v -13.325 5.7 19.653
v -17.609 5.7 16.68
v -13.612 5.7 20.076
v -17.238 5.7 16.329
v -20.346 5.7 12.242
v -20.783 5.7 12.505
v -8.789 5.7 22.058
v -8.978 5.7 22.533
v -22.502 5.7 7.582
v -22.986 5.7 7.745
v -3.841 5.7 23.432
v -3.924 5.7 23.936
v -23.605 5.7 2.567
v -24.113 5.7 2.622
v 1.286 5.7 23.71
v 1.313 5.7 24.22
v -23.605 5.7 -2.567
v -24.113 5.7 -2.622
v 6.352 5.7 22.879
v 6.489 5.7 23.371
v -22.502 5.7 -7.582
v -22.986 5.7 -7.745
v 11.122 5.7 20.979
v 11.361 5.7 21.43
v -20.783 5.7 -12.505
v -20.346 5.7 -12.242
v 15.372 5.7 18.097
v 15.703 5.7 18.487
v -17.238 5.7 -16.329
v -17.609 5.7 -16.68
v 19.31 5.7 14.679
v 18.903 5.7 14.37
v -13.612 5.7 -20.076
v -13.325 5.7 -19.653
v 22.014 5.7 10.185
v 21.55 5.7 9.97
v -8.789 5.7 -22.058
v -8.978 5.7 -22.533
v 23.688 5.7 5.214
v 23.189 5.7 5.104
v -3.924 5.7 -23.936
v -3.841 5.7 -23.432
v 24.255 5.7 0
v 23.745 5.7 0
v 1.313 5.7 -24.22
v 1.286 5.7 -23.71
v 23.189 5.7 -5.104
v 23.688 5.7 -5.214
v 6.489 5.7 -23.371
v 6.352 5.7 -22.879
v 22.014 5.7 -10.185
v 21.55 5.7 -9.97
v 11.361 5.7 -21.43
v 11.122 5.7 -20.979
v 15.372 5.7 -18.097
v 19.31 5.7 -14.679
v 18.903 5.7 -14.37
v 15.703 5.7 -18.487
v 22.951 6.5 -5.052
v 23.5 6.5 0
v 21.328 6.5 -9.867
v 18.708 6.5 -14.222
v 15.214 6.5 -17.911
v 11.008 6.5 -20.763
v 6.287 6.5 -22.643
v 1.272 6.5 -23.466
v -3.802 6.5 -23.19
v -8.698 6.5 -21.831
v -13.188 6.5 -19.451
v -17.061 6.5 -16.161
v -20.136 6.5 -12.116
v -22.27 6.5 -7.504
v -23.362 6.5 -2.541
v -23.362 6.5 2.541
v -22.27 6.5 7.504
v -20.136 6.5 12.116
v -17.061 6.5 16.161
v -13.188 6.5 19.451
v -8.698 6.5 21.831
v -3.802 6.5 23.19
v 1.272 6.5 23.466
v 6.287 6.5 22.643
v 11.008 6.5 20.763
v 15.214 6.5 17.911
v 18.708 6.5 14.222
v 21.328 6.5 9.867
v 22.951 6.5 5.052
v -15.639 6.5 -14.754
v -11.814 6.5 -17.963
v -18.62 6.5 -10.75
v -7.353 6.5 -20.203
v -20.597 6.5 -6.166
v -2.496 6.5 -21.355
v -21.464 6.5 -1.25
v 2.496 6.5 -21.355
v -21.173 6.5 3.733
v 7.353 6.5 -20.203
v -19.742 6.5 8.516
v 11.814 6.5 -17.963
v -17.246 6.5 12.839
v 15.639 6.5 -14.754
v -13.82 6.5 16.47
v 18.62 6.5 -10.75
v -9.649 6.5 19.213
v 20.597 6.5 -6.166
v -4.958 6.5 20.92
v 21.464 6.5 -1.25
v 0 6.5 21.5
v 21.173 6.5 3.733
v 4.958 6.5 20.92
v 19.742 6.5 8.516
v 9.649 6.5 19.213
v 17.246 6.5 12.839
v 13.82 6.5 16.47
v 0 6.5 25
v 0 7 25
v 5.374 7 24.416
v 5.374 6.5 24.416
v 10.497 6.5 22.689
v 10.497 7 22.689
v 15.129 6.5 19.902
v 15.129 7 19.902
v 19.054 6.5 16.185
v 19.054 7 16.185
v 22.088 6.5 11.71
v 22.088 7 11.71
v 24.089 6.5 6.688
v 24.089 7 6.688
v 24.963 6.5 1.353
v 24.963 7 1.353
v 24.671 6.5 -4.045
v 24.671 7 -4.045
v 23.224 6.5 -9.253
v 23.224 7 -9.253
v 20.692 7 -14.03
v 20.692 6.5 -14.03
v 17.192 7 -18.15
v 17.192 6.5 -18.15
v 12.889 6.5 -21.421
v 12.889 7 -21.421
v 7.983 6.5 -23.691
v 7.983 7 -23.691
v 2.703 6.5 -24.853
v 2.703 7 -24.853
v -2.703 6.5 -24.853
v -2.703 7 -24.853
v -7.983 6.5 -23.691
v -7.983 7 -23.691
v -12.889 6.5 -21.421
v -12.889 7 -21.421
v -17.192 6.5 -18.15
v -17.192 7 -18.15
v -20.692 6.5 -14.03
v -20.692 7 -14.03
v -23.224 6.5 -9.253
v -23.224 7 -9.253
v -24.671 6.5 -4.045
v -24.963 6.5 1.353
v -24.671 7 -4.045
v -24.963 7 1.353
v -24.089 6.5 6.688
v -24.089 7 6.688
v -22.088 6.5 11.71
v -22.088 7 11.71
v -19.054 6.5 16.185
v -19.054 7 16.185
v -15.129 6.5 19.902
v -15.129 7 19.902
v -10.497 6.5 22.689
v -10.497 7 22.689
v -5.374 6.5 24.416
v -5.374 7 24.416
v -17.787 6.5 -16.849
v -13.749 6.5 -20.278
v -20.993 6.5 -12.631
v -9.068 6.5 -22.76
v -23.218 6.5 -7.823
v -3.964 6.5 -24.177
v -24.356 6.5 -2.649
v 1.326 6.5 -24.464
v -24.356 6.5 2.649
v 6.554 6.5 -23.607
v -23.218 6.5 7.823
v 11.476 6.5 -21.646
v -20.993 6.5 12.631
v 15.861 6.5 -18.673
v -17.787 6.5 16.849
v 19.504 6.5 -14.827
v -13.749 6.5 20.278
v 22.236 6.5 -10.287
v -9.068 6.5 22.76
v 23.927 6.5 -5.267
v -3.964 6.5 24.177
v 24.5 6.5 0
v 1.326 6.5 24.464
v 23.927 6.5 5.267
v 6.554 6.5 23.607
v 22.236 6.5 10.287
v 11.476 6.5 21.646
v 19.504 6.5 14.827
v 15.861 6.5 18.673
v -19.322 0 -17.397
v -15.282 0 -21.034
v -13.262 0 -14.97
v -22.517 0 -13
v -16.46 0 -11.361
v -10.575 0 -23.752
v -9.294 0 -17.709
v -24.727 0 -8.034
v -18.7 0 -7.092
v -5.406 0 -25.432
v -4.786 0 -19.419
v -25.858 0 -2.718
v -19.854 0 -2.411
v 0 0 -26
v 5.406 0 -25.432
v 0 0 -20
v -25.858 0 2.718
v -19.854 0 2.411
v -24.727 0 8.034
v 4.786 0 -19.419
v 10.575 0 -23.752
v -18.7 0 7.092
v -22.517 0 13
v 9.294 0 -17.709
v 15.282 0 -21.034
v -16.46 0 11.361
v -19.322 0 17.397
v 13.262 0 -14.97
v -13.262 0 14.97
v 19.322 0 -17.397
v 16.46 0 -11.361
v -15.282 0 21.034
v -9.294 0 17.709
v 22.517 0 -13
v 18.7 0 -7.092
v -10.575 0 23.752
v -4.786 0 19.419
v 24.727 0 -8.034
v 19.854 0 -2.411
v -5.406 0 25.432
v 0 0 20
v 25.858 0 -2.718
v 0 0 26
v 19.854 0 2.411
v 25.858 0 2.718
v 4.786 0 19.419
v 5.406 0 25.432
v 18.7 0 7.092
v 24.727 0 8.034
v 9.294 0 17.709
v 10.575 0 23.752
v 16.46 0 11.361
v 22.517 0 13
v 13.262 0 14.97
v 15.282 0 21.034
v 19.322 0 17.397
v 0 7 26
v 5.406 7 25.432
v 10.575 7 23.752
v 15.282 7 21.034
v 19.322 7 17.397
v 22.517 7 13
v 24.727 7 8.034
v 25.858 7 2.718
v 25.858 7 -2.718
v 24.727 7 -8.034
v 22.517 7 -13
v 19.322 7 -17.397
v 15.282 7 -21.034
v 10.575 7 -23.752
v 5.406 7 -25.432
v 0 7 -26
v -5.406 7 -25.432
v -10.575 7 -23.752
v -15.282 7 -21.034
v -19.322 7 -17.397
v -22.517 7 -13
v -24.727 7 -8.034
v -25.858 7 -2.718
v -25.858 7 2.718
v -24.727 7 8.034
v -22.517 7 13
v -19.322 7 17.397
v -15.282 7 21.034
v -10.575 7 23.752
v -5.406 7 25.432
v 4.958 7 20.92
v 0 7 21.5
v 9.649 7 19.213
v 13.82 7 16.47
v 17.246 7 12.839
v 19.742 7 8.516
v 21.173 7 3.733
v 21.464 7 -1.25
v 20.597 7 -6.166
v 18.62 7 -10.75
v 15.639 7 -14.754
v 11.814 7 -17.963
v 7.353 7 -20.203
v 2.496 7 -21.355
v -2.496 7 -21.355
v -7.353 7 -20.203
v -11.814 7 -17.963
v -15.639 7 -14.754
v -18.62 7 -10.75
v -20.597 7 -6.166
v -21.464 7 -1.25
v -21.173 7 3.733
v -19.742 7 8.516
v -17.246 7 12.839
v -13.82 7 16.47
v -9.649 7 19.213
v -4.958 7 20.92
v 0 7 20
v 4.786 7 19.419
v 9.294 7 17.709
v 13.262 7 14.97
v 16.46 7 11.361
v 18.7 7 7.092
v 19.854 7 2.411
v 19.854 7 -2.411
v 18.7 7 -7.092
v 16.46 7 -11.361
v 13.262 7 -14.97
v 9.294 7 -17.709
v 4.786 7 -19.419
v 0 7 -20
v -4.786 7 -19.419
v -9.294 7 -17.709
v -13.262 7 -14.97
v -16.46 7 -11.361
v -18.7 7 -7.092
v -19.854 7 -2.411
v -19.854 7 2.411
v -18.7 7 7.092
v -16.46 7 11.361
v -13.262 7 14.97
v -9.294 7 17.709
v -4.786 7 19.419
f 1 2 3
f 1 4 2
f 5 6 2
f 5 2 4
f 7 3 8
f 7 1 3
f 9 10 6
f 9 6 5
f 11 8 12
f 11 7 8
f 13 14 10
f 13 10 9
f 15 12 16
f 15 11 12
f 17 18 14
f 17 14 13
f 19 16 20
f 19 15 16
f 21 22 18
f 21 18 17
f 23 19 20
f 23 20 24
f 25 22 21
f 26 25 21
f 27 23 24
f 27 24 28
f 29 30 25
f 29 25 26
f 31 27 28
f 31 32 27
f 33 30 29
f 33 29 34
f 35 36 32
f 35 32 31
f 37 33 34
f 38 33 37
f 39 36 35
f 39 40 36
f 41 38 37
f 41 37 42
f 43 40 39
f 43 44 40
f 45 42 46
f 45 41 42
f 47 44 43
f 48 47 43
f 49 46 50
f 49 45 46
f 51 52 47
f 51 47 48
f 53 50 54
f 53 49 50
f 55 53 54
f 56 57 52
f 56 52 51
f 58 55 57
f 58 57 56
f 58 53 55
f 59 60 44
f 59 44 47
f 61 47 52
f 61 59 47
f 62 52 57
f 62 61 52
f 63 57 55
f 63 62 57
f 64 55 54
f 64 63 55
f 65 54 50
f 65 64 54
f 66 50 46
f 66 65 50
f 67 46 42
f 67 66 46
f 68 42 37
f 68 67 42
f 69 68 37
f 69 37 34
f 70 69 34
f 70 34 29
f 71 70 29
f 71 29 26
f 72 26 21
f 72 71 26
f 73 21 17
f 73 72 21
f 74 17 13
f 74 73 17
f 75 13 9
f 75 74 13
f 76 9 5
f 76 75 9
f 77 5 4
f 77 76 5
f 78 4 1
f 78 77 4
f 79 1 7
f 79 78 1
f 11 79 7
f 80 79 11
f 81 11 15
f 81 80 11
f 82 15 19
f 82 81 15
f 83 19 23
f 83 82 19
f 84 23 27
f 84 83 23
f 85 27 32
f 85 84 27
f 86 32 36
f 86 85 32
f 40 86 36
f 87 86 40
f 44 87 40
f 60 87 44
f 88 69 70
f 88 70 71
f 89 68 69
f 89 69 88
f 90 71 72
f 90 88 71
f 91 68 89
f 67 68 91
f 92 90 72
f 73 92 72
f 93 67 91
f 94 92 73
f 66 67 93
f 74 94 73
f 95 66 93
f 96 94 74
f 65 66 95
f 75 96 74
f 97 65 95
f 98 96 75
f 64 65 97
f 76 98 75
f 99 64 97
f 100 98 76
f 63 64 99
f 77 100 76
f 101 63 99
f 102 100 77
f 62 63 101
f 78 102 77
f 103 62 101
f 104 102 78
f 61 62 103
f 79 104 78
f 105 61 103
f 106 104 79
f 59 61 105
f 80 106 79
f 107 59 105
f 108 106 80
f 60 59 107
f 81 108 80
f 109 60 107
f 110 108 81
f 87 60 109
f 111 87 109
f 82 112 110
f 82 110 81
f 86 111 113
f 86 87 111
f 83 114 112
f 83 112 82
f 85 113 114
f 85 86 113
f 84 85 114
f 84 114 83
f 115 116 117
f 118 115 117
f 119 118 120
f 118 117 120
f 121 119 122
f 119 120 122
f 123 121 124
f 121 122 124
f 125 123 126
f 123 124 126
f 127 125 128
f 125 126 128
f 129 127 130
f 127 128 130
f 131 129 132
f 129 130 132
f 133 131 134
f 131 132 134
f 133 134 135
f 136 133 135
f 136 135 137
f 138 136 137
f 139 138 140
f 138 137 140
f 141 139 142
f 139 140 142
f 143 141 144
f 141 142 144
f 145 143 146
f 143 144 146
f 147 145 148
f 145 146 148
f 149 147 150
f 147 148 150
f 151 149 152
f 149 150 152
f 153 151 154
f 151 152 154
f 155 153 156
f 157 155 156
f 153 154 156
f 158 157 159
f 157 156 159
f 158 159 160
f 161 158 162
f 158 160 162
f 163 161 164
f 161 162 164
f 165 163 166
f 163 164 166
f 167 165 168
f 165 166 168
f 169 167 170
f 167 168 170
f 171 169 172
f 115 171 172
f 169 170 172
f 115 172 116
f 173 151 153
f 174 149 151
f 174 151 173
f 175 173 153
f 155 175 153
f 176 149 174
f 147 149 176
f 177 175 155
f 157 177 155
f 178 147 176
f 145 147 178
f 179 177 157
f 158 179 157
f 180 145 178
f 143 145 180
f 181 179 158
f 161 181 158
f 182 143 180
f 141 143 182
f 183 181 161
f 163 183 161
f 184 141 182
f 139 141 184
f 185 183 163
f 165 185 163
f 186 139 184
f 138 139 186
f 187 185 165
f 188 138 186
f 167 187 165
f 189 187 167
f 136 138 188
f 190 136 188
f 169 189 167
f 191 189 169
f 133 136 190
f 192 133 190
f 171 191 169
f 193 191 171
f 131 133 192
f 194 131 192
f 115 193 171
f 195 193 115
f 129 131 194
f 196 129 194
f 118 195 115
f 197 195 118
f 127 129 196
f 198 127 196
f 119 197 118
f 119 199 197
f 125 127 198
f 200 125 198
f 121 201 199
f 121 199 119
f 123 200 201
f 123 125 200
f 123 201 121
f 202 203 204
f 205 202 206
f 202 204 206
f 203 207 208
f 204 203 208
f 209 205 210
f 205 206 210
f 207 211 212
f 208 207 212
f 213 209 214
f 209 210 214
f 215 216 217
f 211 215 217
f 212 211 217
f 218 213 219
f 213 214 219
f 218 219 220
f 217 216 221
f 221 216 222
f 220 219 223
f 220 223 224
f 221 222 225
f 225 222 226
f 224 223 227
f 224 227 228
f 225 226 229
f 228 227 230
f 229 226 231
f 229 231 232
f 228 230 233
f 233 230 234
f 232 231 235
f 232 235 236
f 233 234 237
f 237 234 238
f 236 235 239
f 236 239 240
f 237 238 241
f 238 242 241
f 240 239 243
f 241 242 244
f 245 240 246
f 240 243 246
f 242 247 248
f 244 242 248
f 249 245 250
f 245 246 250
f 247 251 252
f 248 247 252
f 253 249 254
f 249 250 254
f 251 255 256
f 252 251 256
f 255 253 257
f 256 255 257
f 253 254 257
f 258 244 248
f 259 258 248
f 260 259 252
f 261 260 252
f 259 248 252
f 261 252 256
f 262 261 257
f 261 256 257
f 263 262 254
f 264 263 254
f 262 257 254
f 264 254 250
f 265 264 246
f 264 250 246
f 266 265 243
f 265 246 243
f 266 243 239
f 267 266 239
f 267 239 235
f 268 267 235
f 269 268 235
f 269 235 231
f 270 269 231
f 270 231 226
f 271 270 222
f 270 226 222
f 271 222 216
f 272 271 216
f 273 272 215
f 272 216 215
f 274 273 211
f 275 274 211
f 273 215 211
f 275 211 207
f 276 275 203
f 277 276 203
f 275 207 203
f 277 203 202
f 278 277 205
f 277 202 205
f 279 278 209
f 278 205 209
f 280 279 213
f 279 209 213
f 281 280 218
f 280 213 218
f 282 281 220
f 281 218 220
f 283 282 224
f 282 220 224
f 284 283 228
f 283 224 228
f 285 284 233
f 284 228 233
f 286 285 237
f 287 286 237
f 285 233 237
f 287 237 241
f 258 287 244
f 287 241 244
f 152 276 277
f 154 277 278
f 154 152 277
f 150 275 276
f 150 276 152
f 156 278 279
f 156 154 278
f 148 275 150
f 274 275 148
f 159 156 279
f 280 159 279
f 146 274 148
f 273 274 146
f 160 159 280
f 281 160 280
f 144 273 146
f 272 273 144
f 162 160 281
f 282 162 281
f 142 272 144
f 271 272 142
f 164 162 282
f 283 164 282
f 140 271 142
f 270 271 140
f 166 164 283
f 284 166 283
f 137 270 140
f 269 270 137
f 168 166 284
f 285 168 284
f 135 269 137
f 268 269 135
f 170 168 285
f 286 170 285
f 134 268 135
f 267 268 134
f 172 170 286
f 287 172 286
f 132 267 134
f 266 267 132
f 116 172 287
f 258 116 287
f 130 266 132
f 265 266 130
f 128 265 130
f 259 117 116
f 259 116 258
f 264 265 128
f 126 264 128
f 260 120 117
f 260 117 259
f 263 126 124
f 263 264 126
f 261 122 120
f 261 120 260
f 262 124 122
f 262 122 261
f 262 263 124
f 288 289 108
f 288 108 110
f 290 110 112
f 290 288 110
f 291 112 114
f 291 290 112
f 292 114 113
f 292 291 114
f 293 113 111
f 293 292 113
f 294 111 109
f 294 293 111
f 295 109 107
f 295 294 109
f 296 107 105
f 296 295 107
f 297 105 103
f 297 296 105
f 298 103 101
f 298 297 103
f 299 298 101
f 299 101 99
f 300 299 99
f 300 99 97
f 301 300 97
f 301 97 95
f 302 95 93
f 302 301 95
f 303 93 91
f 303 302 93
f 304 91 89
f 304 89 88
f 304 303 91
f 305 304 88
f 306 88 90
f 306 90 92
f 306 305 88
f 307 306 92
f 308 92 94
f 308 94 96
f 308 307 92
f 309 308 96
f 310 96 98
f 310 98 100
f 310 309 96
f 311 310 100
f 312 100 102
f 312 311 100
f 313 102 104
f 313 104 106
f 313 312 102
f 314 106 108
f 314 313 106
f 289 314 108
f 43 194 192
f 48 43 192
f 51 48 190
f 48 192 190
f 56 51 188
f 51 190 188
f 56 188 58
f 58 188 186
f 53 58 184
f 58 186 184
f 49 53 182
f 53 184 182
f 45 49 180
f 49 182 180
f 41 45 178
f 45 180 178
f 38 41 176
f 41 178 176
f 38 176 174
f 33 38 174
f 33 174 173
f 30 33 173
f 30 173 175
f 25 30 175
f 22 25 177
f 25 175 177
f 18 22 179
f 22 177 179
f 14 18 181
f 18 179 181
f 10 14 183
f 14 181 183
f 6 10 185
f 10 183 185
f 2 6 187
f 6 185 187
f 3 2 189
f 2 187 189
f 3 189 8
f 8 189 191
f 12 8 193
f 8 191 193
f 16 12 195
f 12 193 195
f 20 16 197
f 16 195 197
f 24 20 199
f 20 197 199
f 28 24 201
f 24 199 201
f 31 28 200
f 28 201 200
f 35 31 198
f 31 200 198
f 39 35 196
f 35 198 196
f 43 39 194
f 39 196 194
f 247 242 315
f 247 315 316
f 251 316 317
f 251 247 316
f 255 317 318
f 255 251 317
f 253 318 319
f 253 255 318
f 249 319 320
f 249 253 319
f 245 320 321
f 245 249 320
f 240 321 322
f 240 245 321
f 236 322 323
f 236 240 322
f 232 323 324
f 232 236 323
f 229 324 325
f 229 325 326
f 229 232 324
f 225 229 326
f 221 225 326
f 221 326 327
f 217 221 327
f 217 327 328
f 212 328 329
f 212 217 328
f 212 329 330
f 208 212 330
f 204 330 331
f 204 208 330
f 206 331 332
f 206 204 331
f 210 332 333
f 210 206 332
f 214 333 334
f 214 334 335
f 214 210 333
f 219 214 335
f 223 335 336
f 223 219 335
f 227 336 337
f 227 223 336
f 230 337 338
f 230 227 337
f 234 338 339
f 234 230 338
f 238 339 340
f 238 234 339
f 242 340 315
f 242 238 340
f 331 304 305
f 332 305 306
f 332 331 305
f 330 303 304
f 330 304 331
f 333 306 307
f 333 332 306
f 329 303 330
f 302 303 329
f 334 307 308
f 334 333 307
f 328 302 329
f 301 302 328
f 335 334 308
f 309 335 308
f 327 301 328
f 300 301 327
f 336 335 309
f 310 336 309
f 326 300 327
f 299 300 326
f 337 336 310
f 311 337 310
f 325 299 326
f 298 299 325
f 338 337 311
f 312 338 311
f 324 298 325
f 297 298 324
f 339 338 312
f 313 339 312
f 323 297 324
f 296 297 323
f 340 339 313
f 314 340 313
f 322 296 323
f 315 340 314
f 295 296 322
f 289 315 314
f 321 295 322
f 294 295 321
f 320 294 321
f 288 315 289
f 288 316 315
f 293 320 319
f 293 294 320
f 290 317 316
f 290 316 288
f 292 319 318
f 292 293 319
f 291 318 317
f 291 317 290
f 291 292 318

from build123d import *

# Parameters (mm, degrees)
SKETCH_1_R          = 26
SKETCH_1_R_2        = 20
EXTRUDE_1_DEPTH     = 7
SKETCH_2_R          = 25
SKETCH_2_R_2        = 21.5
CUT_EXTRUDE_1_DEPTH = 0.5
SKETCH_3_R          = 24.5
SKETCH_3_R_2        = 23.5
CUT_EXTRUDE_2_DEPTH = 0.8
CUT_EXTRUDE_2_DRAFT = -17


with BuildPart() as part:
    # Эскиз1 → Бобышка-Вытянуть1 (new body)
    with BuildSketch(Plane(origin=(0, 0, 0), x_dir=(1, 0, 0), z_dir=(0, 1, 0))):
        with Locations(Location((0, 0, 0), (0, 0, 270))):
            Circle(SKETCH_1_R)
        with Locations(Location((0, 0, 0), (0, 0, 270))):
            Circle(SKETCH_1_R_2, mode=Mode.SUBTRACT)
    extrude(amount=EXTRUDE_1_DEPTH)

    # Эскиз2 → Вырез-Вытянуть1 (cut)
    with BuildSketch(Plane(origin=(0, 7, 0), x_dir=(1, 0, 0), z_dir=(0, 1, 0))):
        with Locations(Location((0, 0, 0), (0, 0, 270))):
            Circle(SKETCH_2_R)
        with Locations(Location((0, 0, 0), (0, 0, 270))):
            Circle(SKETCH_2_R_2, mode=Mode.SUBTRACT)
    extrude(amount=-CUT_EXTRUDE_1_DEPTH, mode=Mode.SUBTRACT)


with BuildPart() as cut_extrude_2_tool:
    # Эскиз3 → Вырез-Вытянуть2 (with draft: the straight prism first)
    with BuildSketch(Plane(origin=(0, 6.5, 0), x_dir=(1, 0, 0), z_dir=(0, 1, 0))):
        Circle(SKETCH_3_R)
        Circle(SKETCH_3_R_2, mode=Mode.SUBTRACT)
    extrude(amount=-CUT_EXTRUDE_2_DEPTH)
    # Вырез-Вытянуть2: the draft: its side faces are tilted about the plane it starts from
    cut_extrude_2_sides = [cut_extrude_2_tool.faces().sort_by_distance(p)[0] for p in [
        (-24.5, 6.1, 0),
        (-23.5, 6.1, 0),
    ]]
    draft(cut_extrude_2_sides, Plane(origin=(0, 6.5, 0), x_dir=(1, 0, 0), z_dir=(0, 1, 0)), CUT_EXTRUDE_2_DRAFT)


with BuildPart() as part_1:
    add(part.part)

    # Вырез-Вытянуть2: cut by cut_extrude_2_tool
    add(cut_extrude_2_tool.part, mode=Mode.SUBTRACT)


solid = part_1.part
